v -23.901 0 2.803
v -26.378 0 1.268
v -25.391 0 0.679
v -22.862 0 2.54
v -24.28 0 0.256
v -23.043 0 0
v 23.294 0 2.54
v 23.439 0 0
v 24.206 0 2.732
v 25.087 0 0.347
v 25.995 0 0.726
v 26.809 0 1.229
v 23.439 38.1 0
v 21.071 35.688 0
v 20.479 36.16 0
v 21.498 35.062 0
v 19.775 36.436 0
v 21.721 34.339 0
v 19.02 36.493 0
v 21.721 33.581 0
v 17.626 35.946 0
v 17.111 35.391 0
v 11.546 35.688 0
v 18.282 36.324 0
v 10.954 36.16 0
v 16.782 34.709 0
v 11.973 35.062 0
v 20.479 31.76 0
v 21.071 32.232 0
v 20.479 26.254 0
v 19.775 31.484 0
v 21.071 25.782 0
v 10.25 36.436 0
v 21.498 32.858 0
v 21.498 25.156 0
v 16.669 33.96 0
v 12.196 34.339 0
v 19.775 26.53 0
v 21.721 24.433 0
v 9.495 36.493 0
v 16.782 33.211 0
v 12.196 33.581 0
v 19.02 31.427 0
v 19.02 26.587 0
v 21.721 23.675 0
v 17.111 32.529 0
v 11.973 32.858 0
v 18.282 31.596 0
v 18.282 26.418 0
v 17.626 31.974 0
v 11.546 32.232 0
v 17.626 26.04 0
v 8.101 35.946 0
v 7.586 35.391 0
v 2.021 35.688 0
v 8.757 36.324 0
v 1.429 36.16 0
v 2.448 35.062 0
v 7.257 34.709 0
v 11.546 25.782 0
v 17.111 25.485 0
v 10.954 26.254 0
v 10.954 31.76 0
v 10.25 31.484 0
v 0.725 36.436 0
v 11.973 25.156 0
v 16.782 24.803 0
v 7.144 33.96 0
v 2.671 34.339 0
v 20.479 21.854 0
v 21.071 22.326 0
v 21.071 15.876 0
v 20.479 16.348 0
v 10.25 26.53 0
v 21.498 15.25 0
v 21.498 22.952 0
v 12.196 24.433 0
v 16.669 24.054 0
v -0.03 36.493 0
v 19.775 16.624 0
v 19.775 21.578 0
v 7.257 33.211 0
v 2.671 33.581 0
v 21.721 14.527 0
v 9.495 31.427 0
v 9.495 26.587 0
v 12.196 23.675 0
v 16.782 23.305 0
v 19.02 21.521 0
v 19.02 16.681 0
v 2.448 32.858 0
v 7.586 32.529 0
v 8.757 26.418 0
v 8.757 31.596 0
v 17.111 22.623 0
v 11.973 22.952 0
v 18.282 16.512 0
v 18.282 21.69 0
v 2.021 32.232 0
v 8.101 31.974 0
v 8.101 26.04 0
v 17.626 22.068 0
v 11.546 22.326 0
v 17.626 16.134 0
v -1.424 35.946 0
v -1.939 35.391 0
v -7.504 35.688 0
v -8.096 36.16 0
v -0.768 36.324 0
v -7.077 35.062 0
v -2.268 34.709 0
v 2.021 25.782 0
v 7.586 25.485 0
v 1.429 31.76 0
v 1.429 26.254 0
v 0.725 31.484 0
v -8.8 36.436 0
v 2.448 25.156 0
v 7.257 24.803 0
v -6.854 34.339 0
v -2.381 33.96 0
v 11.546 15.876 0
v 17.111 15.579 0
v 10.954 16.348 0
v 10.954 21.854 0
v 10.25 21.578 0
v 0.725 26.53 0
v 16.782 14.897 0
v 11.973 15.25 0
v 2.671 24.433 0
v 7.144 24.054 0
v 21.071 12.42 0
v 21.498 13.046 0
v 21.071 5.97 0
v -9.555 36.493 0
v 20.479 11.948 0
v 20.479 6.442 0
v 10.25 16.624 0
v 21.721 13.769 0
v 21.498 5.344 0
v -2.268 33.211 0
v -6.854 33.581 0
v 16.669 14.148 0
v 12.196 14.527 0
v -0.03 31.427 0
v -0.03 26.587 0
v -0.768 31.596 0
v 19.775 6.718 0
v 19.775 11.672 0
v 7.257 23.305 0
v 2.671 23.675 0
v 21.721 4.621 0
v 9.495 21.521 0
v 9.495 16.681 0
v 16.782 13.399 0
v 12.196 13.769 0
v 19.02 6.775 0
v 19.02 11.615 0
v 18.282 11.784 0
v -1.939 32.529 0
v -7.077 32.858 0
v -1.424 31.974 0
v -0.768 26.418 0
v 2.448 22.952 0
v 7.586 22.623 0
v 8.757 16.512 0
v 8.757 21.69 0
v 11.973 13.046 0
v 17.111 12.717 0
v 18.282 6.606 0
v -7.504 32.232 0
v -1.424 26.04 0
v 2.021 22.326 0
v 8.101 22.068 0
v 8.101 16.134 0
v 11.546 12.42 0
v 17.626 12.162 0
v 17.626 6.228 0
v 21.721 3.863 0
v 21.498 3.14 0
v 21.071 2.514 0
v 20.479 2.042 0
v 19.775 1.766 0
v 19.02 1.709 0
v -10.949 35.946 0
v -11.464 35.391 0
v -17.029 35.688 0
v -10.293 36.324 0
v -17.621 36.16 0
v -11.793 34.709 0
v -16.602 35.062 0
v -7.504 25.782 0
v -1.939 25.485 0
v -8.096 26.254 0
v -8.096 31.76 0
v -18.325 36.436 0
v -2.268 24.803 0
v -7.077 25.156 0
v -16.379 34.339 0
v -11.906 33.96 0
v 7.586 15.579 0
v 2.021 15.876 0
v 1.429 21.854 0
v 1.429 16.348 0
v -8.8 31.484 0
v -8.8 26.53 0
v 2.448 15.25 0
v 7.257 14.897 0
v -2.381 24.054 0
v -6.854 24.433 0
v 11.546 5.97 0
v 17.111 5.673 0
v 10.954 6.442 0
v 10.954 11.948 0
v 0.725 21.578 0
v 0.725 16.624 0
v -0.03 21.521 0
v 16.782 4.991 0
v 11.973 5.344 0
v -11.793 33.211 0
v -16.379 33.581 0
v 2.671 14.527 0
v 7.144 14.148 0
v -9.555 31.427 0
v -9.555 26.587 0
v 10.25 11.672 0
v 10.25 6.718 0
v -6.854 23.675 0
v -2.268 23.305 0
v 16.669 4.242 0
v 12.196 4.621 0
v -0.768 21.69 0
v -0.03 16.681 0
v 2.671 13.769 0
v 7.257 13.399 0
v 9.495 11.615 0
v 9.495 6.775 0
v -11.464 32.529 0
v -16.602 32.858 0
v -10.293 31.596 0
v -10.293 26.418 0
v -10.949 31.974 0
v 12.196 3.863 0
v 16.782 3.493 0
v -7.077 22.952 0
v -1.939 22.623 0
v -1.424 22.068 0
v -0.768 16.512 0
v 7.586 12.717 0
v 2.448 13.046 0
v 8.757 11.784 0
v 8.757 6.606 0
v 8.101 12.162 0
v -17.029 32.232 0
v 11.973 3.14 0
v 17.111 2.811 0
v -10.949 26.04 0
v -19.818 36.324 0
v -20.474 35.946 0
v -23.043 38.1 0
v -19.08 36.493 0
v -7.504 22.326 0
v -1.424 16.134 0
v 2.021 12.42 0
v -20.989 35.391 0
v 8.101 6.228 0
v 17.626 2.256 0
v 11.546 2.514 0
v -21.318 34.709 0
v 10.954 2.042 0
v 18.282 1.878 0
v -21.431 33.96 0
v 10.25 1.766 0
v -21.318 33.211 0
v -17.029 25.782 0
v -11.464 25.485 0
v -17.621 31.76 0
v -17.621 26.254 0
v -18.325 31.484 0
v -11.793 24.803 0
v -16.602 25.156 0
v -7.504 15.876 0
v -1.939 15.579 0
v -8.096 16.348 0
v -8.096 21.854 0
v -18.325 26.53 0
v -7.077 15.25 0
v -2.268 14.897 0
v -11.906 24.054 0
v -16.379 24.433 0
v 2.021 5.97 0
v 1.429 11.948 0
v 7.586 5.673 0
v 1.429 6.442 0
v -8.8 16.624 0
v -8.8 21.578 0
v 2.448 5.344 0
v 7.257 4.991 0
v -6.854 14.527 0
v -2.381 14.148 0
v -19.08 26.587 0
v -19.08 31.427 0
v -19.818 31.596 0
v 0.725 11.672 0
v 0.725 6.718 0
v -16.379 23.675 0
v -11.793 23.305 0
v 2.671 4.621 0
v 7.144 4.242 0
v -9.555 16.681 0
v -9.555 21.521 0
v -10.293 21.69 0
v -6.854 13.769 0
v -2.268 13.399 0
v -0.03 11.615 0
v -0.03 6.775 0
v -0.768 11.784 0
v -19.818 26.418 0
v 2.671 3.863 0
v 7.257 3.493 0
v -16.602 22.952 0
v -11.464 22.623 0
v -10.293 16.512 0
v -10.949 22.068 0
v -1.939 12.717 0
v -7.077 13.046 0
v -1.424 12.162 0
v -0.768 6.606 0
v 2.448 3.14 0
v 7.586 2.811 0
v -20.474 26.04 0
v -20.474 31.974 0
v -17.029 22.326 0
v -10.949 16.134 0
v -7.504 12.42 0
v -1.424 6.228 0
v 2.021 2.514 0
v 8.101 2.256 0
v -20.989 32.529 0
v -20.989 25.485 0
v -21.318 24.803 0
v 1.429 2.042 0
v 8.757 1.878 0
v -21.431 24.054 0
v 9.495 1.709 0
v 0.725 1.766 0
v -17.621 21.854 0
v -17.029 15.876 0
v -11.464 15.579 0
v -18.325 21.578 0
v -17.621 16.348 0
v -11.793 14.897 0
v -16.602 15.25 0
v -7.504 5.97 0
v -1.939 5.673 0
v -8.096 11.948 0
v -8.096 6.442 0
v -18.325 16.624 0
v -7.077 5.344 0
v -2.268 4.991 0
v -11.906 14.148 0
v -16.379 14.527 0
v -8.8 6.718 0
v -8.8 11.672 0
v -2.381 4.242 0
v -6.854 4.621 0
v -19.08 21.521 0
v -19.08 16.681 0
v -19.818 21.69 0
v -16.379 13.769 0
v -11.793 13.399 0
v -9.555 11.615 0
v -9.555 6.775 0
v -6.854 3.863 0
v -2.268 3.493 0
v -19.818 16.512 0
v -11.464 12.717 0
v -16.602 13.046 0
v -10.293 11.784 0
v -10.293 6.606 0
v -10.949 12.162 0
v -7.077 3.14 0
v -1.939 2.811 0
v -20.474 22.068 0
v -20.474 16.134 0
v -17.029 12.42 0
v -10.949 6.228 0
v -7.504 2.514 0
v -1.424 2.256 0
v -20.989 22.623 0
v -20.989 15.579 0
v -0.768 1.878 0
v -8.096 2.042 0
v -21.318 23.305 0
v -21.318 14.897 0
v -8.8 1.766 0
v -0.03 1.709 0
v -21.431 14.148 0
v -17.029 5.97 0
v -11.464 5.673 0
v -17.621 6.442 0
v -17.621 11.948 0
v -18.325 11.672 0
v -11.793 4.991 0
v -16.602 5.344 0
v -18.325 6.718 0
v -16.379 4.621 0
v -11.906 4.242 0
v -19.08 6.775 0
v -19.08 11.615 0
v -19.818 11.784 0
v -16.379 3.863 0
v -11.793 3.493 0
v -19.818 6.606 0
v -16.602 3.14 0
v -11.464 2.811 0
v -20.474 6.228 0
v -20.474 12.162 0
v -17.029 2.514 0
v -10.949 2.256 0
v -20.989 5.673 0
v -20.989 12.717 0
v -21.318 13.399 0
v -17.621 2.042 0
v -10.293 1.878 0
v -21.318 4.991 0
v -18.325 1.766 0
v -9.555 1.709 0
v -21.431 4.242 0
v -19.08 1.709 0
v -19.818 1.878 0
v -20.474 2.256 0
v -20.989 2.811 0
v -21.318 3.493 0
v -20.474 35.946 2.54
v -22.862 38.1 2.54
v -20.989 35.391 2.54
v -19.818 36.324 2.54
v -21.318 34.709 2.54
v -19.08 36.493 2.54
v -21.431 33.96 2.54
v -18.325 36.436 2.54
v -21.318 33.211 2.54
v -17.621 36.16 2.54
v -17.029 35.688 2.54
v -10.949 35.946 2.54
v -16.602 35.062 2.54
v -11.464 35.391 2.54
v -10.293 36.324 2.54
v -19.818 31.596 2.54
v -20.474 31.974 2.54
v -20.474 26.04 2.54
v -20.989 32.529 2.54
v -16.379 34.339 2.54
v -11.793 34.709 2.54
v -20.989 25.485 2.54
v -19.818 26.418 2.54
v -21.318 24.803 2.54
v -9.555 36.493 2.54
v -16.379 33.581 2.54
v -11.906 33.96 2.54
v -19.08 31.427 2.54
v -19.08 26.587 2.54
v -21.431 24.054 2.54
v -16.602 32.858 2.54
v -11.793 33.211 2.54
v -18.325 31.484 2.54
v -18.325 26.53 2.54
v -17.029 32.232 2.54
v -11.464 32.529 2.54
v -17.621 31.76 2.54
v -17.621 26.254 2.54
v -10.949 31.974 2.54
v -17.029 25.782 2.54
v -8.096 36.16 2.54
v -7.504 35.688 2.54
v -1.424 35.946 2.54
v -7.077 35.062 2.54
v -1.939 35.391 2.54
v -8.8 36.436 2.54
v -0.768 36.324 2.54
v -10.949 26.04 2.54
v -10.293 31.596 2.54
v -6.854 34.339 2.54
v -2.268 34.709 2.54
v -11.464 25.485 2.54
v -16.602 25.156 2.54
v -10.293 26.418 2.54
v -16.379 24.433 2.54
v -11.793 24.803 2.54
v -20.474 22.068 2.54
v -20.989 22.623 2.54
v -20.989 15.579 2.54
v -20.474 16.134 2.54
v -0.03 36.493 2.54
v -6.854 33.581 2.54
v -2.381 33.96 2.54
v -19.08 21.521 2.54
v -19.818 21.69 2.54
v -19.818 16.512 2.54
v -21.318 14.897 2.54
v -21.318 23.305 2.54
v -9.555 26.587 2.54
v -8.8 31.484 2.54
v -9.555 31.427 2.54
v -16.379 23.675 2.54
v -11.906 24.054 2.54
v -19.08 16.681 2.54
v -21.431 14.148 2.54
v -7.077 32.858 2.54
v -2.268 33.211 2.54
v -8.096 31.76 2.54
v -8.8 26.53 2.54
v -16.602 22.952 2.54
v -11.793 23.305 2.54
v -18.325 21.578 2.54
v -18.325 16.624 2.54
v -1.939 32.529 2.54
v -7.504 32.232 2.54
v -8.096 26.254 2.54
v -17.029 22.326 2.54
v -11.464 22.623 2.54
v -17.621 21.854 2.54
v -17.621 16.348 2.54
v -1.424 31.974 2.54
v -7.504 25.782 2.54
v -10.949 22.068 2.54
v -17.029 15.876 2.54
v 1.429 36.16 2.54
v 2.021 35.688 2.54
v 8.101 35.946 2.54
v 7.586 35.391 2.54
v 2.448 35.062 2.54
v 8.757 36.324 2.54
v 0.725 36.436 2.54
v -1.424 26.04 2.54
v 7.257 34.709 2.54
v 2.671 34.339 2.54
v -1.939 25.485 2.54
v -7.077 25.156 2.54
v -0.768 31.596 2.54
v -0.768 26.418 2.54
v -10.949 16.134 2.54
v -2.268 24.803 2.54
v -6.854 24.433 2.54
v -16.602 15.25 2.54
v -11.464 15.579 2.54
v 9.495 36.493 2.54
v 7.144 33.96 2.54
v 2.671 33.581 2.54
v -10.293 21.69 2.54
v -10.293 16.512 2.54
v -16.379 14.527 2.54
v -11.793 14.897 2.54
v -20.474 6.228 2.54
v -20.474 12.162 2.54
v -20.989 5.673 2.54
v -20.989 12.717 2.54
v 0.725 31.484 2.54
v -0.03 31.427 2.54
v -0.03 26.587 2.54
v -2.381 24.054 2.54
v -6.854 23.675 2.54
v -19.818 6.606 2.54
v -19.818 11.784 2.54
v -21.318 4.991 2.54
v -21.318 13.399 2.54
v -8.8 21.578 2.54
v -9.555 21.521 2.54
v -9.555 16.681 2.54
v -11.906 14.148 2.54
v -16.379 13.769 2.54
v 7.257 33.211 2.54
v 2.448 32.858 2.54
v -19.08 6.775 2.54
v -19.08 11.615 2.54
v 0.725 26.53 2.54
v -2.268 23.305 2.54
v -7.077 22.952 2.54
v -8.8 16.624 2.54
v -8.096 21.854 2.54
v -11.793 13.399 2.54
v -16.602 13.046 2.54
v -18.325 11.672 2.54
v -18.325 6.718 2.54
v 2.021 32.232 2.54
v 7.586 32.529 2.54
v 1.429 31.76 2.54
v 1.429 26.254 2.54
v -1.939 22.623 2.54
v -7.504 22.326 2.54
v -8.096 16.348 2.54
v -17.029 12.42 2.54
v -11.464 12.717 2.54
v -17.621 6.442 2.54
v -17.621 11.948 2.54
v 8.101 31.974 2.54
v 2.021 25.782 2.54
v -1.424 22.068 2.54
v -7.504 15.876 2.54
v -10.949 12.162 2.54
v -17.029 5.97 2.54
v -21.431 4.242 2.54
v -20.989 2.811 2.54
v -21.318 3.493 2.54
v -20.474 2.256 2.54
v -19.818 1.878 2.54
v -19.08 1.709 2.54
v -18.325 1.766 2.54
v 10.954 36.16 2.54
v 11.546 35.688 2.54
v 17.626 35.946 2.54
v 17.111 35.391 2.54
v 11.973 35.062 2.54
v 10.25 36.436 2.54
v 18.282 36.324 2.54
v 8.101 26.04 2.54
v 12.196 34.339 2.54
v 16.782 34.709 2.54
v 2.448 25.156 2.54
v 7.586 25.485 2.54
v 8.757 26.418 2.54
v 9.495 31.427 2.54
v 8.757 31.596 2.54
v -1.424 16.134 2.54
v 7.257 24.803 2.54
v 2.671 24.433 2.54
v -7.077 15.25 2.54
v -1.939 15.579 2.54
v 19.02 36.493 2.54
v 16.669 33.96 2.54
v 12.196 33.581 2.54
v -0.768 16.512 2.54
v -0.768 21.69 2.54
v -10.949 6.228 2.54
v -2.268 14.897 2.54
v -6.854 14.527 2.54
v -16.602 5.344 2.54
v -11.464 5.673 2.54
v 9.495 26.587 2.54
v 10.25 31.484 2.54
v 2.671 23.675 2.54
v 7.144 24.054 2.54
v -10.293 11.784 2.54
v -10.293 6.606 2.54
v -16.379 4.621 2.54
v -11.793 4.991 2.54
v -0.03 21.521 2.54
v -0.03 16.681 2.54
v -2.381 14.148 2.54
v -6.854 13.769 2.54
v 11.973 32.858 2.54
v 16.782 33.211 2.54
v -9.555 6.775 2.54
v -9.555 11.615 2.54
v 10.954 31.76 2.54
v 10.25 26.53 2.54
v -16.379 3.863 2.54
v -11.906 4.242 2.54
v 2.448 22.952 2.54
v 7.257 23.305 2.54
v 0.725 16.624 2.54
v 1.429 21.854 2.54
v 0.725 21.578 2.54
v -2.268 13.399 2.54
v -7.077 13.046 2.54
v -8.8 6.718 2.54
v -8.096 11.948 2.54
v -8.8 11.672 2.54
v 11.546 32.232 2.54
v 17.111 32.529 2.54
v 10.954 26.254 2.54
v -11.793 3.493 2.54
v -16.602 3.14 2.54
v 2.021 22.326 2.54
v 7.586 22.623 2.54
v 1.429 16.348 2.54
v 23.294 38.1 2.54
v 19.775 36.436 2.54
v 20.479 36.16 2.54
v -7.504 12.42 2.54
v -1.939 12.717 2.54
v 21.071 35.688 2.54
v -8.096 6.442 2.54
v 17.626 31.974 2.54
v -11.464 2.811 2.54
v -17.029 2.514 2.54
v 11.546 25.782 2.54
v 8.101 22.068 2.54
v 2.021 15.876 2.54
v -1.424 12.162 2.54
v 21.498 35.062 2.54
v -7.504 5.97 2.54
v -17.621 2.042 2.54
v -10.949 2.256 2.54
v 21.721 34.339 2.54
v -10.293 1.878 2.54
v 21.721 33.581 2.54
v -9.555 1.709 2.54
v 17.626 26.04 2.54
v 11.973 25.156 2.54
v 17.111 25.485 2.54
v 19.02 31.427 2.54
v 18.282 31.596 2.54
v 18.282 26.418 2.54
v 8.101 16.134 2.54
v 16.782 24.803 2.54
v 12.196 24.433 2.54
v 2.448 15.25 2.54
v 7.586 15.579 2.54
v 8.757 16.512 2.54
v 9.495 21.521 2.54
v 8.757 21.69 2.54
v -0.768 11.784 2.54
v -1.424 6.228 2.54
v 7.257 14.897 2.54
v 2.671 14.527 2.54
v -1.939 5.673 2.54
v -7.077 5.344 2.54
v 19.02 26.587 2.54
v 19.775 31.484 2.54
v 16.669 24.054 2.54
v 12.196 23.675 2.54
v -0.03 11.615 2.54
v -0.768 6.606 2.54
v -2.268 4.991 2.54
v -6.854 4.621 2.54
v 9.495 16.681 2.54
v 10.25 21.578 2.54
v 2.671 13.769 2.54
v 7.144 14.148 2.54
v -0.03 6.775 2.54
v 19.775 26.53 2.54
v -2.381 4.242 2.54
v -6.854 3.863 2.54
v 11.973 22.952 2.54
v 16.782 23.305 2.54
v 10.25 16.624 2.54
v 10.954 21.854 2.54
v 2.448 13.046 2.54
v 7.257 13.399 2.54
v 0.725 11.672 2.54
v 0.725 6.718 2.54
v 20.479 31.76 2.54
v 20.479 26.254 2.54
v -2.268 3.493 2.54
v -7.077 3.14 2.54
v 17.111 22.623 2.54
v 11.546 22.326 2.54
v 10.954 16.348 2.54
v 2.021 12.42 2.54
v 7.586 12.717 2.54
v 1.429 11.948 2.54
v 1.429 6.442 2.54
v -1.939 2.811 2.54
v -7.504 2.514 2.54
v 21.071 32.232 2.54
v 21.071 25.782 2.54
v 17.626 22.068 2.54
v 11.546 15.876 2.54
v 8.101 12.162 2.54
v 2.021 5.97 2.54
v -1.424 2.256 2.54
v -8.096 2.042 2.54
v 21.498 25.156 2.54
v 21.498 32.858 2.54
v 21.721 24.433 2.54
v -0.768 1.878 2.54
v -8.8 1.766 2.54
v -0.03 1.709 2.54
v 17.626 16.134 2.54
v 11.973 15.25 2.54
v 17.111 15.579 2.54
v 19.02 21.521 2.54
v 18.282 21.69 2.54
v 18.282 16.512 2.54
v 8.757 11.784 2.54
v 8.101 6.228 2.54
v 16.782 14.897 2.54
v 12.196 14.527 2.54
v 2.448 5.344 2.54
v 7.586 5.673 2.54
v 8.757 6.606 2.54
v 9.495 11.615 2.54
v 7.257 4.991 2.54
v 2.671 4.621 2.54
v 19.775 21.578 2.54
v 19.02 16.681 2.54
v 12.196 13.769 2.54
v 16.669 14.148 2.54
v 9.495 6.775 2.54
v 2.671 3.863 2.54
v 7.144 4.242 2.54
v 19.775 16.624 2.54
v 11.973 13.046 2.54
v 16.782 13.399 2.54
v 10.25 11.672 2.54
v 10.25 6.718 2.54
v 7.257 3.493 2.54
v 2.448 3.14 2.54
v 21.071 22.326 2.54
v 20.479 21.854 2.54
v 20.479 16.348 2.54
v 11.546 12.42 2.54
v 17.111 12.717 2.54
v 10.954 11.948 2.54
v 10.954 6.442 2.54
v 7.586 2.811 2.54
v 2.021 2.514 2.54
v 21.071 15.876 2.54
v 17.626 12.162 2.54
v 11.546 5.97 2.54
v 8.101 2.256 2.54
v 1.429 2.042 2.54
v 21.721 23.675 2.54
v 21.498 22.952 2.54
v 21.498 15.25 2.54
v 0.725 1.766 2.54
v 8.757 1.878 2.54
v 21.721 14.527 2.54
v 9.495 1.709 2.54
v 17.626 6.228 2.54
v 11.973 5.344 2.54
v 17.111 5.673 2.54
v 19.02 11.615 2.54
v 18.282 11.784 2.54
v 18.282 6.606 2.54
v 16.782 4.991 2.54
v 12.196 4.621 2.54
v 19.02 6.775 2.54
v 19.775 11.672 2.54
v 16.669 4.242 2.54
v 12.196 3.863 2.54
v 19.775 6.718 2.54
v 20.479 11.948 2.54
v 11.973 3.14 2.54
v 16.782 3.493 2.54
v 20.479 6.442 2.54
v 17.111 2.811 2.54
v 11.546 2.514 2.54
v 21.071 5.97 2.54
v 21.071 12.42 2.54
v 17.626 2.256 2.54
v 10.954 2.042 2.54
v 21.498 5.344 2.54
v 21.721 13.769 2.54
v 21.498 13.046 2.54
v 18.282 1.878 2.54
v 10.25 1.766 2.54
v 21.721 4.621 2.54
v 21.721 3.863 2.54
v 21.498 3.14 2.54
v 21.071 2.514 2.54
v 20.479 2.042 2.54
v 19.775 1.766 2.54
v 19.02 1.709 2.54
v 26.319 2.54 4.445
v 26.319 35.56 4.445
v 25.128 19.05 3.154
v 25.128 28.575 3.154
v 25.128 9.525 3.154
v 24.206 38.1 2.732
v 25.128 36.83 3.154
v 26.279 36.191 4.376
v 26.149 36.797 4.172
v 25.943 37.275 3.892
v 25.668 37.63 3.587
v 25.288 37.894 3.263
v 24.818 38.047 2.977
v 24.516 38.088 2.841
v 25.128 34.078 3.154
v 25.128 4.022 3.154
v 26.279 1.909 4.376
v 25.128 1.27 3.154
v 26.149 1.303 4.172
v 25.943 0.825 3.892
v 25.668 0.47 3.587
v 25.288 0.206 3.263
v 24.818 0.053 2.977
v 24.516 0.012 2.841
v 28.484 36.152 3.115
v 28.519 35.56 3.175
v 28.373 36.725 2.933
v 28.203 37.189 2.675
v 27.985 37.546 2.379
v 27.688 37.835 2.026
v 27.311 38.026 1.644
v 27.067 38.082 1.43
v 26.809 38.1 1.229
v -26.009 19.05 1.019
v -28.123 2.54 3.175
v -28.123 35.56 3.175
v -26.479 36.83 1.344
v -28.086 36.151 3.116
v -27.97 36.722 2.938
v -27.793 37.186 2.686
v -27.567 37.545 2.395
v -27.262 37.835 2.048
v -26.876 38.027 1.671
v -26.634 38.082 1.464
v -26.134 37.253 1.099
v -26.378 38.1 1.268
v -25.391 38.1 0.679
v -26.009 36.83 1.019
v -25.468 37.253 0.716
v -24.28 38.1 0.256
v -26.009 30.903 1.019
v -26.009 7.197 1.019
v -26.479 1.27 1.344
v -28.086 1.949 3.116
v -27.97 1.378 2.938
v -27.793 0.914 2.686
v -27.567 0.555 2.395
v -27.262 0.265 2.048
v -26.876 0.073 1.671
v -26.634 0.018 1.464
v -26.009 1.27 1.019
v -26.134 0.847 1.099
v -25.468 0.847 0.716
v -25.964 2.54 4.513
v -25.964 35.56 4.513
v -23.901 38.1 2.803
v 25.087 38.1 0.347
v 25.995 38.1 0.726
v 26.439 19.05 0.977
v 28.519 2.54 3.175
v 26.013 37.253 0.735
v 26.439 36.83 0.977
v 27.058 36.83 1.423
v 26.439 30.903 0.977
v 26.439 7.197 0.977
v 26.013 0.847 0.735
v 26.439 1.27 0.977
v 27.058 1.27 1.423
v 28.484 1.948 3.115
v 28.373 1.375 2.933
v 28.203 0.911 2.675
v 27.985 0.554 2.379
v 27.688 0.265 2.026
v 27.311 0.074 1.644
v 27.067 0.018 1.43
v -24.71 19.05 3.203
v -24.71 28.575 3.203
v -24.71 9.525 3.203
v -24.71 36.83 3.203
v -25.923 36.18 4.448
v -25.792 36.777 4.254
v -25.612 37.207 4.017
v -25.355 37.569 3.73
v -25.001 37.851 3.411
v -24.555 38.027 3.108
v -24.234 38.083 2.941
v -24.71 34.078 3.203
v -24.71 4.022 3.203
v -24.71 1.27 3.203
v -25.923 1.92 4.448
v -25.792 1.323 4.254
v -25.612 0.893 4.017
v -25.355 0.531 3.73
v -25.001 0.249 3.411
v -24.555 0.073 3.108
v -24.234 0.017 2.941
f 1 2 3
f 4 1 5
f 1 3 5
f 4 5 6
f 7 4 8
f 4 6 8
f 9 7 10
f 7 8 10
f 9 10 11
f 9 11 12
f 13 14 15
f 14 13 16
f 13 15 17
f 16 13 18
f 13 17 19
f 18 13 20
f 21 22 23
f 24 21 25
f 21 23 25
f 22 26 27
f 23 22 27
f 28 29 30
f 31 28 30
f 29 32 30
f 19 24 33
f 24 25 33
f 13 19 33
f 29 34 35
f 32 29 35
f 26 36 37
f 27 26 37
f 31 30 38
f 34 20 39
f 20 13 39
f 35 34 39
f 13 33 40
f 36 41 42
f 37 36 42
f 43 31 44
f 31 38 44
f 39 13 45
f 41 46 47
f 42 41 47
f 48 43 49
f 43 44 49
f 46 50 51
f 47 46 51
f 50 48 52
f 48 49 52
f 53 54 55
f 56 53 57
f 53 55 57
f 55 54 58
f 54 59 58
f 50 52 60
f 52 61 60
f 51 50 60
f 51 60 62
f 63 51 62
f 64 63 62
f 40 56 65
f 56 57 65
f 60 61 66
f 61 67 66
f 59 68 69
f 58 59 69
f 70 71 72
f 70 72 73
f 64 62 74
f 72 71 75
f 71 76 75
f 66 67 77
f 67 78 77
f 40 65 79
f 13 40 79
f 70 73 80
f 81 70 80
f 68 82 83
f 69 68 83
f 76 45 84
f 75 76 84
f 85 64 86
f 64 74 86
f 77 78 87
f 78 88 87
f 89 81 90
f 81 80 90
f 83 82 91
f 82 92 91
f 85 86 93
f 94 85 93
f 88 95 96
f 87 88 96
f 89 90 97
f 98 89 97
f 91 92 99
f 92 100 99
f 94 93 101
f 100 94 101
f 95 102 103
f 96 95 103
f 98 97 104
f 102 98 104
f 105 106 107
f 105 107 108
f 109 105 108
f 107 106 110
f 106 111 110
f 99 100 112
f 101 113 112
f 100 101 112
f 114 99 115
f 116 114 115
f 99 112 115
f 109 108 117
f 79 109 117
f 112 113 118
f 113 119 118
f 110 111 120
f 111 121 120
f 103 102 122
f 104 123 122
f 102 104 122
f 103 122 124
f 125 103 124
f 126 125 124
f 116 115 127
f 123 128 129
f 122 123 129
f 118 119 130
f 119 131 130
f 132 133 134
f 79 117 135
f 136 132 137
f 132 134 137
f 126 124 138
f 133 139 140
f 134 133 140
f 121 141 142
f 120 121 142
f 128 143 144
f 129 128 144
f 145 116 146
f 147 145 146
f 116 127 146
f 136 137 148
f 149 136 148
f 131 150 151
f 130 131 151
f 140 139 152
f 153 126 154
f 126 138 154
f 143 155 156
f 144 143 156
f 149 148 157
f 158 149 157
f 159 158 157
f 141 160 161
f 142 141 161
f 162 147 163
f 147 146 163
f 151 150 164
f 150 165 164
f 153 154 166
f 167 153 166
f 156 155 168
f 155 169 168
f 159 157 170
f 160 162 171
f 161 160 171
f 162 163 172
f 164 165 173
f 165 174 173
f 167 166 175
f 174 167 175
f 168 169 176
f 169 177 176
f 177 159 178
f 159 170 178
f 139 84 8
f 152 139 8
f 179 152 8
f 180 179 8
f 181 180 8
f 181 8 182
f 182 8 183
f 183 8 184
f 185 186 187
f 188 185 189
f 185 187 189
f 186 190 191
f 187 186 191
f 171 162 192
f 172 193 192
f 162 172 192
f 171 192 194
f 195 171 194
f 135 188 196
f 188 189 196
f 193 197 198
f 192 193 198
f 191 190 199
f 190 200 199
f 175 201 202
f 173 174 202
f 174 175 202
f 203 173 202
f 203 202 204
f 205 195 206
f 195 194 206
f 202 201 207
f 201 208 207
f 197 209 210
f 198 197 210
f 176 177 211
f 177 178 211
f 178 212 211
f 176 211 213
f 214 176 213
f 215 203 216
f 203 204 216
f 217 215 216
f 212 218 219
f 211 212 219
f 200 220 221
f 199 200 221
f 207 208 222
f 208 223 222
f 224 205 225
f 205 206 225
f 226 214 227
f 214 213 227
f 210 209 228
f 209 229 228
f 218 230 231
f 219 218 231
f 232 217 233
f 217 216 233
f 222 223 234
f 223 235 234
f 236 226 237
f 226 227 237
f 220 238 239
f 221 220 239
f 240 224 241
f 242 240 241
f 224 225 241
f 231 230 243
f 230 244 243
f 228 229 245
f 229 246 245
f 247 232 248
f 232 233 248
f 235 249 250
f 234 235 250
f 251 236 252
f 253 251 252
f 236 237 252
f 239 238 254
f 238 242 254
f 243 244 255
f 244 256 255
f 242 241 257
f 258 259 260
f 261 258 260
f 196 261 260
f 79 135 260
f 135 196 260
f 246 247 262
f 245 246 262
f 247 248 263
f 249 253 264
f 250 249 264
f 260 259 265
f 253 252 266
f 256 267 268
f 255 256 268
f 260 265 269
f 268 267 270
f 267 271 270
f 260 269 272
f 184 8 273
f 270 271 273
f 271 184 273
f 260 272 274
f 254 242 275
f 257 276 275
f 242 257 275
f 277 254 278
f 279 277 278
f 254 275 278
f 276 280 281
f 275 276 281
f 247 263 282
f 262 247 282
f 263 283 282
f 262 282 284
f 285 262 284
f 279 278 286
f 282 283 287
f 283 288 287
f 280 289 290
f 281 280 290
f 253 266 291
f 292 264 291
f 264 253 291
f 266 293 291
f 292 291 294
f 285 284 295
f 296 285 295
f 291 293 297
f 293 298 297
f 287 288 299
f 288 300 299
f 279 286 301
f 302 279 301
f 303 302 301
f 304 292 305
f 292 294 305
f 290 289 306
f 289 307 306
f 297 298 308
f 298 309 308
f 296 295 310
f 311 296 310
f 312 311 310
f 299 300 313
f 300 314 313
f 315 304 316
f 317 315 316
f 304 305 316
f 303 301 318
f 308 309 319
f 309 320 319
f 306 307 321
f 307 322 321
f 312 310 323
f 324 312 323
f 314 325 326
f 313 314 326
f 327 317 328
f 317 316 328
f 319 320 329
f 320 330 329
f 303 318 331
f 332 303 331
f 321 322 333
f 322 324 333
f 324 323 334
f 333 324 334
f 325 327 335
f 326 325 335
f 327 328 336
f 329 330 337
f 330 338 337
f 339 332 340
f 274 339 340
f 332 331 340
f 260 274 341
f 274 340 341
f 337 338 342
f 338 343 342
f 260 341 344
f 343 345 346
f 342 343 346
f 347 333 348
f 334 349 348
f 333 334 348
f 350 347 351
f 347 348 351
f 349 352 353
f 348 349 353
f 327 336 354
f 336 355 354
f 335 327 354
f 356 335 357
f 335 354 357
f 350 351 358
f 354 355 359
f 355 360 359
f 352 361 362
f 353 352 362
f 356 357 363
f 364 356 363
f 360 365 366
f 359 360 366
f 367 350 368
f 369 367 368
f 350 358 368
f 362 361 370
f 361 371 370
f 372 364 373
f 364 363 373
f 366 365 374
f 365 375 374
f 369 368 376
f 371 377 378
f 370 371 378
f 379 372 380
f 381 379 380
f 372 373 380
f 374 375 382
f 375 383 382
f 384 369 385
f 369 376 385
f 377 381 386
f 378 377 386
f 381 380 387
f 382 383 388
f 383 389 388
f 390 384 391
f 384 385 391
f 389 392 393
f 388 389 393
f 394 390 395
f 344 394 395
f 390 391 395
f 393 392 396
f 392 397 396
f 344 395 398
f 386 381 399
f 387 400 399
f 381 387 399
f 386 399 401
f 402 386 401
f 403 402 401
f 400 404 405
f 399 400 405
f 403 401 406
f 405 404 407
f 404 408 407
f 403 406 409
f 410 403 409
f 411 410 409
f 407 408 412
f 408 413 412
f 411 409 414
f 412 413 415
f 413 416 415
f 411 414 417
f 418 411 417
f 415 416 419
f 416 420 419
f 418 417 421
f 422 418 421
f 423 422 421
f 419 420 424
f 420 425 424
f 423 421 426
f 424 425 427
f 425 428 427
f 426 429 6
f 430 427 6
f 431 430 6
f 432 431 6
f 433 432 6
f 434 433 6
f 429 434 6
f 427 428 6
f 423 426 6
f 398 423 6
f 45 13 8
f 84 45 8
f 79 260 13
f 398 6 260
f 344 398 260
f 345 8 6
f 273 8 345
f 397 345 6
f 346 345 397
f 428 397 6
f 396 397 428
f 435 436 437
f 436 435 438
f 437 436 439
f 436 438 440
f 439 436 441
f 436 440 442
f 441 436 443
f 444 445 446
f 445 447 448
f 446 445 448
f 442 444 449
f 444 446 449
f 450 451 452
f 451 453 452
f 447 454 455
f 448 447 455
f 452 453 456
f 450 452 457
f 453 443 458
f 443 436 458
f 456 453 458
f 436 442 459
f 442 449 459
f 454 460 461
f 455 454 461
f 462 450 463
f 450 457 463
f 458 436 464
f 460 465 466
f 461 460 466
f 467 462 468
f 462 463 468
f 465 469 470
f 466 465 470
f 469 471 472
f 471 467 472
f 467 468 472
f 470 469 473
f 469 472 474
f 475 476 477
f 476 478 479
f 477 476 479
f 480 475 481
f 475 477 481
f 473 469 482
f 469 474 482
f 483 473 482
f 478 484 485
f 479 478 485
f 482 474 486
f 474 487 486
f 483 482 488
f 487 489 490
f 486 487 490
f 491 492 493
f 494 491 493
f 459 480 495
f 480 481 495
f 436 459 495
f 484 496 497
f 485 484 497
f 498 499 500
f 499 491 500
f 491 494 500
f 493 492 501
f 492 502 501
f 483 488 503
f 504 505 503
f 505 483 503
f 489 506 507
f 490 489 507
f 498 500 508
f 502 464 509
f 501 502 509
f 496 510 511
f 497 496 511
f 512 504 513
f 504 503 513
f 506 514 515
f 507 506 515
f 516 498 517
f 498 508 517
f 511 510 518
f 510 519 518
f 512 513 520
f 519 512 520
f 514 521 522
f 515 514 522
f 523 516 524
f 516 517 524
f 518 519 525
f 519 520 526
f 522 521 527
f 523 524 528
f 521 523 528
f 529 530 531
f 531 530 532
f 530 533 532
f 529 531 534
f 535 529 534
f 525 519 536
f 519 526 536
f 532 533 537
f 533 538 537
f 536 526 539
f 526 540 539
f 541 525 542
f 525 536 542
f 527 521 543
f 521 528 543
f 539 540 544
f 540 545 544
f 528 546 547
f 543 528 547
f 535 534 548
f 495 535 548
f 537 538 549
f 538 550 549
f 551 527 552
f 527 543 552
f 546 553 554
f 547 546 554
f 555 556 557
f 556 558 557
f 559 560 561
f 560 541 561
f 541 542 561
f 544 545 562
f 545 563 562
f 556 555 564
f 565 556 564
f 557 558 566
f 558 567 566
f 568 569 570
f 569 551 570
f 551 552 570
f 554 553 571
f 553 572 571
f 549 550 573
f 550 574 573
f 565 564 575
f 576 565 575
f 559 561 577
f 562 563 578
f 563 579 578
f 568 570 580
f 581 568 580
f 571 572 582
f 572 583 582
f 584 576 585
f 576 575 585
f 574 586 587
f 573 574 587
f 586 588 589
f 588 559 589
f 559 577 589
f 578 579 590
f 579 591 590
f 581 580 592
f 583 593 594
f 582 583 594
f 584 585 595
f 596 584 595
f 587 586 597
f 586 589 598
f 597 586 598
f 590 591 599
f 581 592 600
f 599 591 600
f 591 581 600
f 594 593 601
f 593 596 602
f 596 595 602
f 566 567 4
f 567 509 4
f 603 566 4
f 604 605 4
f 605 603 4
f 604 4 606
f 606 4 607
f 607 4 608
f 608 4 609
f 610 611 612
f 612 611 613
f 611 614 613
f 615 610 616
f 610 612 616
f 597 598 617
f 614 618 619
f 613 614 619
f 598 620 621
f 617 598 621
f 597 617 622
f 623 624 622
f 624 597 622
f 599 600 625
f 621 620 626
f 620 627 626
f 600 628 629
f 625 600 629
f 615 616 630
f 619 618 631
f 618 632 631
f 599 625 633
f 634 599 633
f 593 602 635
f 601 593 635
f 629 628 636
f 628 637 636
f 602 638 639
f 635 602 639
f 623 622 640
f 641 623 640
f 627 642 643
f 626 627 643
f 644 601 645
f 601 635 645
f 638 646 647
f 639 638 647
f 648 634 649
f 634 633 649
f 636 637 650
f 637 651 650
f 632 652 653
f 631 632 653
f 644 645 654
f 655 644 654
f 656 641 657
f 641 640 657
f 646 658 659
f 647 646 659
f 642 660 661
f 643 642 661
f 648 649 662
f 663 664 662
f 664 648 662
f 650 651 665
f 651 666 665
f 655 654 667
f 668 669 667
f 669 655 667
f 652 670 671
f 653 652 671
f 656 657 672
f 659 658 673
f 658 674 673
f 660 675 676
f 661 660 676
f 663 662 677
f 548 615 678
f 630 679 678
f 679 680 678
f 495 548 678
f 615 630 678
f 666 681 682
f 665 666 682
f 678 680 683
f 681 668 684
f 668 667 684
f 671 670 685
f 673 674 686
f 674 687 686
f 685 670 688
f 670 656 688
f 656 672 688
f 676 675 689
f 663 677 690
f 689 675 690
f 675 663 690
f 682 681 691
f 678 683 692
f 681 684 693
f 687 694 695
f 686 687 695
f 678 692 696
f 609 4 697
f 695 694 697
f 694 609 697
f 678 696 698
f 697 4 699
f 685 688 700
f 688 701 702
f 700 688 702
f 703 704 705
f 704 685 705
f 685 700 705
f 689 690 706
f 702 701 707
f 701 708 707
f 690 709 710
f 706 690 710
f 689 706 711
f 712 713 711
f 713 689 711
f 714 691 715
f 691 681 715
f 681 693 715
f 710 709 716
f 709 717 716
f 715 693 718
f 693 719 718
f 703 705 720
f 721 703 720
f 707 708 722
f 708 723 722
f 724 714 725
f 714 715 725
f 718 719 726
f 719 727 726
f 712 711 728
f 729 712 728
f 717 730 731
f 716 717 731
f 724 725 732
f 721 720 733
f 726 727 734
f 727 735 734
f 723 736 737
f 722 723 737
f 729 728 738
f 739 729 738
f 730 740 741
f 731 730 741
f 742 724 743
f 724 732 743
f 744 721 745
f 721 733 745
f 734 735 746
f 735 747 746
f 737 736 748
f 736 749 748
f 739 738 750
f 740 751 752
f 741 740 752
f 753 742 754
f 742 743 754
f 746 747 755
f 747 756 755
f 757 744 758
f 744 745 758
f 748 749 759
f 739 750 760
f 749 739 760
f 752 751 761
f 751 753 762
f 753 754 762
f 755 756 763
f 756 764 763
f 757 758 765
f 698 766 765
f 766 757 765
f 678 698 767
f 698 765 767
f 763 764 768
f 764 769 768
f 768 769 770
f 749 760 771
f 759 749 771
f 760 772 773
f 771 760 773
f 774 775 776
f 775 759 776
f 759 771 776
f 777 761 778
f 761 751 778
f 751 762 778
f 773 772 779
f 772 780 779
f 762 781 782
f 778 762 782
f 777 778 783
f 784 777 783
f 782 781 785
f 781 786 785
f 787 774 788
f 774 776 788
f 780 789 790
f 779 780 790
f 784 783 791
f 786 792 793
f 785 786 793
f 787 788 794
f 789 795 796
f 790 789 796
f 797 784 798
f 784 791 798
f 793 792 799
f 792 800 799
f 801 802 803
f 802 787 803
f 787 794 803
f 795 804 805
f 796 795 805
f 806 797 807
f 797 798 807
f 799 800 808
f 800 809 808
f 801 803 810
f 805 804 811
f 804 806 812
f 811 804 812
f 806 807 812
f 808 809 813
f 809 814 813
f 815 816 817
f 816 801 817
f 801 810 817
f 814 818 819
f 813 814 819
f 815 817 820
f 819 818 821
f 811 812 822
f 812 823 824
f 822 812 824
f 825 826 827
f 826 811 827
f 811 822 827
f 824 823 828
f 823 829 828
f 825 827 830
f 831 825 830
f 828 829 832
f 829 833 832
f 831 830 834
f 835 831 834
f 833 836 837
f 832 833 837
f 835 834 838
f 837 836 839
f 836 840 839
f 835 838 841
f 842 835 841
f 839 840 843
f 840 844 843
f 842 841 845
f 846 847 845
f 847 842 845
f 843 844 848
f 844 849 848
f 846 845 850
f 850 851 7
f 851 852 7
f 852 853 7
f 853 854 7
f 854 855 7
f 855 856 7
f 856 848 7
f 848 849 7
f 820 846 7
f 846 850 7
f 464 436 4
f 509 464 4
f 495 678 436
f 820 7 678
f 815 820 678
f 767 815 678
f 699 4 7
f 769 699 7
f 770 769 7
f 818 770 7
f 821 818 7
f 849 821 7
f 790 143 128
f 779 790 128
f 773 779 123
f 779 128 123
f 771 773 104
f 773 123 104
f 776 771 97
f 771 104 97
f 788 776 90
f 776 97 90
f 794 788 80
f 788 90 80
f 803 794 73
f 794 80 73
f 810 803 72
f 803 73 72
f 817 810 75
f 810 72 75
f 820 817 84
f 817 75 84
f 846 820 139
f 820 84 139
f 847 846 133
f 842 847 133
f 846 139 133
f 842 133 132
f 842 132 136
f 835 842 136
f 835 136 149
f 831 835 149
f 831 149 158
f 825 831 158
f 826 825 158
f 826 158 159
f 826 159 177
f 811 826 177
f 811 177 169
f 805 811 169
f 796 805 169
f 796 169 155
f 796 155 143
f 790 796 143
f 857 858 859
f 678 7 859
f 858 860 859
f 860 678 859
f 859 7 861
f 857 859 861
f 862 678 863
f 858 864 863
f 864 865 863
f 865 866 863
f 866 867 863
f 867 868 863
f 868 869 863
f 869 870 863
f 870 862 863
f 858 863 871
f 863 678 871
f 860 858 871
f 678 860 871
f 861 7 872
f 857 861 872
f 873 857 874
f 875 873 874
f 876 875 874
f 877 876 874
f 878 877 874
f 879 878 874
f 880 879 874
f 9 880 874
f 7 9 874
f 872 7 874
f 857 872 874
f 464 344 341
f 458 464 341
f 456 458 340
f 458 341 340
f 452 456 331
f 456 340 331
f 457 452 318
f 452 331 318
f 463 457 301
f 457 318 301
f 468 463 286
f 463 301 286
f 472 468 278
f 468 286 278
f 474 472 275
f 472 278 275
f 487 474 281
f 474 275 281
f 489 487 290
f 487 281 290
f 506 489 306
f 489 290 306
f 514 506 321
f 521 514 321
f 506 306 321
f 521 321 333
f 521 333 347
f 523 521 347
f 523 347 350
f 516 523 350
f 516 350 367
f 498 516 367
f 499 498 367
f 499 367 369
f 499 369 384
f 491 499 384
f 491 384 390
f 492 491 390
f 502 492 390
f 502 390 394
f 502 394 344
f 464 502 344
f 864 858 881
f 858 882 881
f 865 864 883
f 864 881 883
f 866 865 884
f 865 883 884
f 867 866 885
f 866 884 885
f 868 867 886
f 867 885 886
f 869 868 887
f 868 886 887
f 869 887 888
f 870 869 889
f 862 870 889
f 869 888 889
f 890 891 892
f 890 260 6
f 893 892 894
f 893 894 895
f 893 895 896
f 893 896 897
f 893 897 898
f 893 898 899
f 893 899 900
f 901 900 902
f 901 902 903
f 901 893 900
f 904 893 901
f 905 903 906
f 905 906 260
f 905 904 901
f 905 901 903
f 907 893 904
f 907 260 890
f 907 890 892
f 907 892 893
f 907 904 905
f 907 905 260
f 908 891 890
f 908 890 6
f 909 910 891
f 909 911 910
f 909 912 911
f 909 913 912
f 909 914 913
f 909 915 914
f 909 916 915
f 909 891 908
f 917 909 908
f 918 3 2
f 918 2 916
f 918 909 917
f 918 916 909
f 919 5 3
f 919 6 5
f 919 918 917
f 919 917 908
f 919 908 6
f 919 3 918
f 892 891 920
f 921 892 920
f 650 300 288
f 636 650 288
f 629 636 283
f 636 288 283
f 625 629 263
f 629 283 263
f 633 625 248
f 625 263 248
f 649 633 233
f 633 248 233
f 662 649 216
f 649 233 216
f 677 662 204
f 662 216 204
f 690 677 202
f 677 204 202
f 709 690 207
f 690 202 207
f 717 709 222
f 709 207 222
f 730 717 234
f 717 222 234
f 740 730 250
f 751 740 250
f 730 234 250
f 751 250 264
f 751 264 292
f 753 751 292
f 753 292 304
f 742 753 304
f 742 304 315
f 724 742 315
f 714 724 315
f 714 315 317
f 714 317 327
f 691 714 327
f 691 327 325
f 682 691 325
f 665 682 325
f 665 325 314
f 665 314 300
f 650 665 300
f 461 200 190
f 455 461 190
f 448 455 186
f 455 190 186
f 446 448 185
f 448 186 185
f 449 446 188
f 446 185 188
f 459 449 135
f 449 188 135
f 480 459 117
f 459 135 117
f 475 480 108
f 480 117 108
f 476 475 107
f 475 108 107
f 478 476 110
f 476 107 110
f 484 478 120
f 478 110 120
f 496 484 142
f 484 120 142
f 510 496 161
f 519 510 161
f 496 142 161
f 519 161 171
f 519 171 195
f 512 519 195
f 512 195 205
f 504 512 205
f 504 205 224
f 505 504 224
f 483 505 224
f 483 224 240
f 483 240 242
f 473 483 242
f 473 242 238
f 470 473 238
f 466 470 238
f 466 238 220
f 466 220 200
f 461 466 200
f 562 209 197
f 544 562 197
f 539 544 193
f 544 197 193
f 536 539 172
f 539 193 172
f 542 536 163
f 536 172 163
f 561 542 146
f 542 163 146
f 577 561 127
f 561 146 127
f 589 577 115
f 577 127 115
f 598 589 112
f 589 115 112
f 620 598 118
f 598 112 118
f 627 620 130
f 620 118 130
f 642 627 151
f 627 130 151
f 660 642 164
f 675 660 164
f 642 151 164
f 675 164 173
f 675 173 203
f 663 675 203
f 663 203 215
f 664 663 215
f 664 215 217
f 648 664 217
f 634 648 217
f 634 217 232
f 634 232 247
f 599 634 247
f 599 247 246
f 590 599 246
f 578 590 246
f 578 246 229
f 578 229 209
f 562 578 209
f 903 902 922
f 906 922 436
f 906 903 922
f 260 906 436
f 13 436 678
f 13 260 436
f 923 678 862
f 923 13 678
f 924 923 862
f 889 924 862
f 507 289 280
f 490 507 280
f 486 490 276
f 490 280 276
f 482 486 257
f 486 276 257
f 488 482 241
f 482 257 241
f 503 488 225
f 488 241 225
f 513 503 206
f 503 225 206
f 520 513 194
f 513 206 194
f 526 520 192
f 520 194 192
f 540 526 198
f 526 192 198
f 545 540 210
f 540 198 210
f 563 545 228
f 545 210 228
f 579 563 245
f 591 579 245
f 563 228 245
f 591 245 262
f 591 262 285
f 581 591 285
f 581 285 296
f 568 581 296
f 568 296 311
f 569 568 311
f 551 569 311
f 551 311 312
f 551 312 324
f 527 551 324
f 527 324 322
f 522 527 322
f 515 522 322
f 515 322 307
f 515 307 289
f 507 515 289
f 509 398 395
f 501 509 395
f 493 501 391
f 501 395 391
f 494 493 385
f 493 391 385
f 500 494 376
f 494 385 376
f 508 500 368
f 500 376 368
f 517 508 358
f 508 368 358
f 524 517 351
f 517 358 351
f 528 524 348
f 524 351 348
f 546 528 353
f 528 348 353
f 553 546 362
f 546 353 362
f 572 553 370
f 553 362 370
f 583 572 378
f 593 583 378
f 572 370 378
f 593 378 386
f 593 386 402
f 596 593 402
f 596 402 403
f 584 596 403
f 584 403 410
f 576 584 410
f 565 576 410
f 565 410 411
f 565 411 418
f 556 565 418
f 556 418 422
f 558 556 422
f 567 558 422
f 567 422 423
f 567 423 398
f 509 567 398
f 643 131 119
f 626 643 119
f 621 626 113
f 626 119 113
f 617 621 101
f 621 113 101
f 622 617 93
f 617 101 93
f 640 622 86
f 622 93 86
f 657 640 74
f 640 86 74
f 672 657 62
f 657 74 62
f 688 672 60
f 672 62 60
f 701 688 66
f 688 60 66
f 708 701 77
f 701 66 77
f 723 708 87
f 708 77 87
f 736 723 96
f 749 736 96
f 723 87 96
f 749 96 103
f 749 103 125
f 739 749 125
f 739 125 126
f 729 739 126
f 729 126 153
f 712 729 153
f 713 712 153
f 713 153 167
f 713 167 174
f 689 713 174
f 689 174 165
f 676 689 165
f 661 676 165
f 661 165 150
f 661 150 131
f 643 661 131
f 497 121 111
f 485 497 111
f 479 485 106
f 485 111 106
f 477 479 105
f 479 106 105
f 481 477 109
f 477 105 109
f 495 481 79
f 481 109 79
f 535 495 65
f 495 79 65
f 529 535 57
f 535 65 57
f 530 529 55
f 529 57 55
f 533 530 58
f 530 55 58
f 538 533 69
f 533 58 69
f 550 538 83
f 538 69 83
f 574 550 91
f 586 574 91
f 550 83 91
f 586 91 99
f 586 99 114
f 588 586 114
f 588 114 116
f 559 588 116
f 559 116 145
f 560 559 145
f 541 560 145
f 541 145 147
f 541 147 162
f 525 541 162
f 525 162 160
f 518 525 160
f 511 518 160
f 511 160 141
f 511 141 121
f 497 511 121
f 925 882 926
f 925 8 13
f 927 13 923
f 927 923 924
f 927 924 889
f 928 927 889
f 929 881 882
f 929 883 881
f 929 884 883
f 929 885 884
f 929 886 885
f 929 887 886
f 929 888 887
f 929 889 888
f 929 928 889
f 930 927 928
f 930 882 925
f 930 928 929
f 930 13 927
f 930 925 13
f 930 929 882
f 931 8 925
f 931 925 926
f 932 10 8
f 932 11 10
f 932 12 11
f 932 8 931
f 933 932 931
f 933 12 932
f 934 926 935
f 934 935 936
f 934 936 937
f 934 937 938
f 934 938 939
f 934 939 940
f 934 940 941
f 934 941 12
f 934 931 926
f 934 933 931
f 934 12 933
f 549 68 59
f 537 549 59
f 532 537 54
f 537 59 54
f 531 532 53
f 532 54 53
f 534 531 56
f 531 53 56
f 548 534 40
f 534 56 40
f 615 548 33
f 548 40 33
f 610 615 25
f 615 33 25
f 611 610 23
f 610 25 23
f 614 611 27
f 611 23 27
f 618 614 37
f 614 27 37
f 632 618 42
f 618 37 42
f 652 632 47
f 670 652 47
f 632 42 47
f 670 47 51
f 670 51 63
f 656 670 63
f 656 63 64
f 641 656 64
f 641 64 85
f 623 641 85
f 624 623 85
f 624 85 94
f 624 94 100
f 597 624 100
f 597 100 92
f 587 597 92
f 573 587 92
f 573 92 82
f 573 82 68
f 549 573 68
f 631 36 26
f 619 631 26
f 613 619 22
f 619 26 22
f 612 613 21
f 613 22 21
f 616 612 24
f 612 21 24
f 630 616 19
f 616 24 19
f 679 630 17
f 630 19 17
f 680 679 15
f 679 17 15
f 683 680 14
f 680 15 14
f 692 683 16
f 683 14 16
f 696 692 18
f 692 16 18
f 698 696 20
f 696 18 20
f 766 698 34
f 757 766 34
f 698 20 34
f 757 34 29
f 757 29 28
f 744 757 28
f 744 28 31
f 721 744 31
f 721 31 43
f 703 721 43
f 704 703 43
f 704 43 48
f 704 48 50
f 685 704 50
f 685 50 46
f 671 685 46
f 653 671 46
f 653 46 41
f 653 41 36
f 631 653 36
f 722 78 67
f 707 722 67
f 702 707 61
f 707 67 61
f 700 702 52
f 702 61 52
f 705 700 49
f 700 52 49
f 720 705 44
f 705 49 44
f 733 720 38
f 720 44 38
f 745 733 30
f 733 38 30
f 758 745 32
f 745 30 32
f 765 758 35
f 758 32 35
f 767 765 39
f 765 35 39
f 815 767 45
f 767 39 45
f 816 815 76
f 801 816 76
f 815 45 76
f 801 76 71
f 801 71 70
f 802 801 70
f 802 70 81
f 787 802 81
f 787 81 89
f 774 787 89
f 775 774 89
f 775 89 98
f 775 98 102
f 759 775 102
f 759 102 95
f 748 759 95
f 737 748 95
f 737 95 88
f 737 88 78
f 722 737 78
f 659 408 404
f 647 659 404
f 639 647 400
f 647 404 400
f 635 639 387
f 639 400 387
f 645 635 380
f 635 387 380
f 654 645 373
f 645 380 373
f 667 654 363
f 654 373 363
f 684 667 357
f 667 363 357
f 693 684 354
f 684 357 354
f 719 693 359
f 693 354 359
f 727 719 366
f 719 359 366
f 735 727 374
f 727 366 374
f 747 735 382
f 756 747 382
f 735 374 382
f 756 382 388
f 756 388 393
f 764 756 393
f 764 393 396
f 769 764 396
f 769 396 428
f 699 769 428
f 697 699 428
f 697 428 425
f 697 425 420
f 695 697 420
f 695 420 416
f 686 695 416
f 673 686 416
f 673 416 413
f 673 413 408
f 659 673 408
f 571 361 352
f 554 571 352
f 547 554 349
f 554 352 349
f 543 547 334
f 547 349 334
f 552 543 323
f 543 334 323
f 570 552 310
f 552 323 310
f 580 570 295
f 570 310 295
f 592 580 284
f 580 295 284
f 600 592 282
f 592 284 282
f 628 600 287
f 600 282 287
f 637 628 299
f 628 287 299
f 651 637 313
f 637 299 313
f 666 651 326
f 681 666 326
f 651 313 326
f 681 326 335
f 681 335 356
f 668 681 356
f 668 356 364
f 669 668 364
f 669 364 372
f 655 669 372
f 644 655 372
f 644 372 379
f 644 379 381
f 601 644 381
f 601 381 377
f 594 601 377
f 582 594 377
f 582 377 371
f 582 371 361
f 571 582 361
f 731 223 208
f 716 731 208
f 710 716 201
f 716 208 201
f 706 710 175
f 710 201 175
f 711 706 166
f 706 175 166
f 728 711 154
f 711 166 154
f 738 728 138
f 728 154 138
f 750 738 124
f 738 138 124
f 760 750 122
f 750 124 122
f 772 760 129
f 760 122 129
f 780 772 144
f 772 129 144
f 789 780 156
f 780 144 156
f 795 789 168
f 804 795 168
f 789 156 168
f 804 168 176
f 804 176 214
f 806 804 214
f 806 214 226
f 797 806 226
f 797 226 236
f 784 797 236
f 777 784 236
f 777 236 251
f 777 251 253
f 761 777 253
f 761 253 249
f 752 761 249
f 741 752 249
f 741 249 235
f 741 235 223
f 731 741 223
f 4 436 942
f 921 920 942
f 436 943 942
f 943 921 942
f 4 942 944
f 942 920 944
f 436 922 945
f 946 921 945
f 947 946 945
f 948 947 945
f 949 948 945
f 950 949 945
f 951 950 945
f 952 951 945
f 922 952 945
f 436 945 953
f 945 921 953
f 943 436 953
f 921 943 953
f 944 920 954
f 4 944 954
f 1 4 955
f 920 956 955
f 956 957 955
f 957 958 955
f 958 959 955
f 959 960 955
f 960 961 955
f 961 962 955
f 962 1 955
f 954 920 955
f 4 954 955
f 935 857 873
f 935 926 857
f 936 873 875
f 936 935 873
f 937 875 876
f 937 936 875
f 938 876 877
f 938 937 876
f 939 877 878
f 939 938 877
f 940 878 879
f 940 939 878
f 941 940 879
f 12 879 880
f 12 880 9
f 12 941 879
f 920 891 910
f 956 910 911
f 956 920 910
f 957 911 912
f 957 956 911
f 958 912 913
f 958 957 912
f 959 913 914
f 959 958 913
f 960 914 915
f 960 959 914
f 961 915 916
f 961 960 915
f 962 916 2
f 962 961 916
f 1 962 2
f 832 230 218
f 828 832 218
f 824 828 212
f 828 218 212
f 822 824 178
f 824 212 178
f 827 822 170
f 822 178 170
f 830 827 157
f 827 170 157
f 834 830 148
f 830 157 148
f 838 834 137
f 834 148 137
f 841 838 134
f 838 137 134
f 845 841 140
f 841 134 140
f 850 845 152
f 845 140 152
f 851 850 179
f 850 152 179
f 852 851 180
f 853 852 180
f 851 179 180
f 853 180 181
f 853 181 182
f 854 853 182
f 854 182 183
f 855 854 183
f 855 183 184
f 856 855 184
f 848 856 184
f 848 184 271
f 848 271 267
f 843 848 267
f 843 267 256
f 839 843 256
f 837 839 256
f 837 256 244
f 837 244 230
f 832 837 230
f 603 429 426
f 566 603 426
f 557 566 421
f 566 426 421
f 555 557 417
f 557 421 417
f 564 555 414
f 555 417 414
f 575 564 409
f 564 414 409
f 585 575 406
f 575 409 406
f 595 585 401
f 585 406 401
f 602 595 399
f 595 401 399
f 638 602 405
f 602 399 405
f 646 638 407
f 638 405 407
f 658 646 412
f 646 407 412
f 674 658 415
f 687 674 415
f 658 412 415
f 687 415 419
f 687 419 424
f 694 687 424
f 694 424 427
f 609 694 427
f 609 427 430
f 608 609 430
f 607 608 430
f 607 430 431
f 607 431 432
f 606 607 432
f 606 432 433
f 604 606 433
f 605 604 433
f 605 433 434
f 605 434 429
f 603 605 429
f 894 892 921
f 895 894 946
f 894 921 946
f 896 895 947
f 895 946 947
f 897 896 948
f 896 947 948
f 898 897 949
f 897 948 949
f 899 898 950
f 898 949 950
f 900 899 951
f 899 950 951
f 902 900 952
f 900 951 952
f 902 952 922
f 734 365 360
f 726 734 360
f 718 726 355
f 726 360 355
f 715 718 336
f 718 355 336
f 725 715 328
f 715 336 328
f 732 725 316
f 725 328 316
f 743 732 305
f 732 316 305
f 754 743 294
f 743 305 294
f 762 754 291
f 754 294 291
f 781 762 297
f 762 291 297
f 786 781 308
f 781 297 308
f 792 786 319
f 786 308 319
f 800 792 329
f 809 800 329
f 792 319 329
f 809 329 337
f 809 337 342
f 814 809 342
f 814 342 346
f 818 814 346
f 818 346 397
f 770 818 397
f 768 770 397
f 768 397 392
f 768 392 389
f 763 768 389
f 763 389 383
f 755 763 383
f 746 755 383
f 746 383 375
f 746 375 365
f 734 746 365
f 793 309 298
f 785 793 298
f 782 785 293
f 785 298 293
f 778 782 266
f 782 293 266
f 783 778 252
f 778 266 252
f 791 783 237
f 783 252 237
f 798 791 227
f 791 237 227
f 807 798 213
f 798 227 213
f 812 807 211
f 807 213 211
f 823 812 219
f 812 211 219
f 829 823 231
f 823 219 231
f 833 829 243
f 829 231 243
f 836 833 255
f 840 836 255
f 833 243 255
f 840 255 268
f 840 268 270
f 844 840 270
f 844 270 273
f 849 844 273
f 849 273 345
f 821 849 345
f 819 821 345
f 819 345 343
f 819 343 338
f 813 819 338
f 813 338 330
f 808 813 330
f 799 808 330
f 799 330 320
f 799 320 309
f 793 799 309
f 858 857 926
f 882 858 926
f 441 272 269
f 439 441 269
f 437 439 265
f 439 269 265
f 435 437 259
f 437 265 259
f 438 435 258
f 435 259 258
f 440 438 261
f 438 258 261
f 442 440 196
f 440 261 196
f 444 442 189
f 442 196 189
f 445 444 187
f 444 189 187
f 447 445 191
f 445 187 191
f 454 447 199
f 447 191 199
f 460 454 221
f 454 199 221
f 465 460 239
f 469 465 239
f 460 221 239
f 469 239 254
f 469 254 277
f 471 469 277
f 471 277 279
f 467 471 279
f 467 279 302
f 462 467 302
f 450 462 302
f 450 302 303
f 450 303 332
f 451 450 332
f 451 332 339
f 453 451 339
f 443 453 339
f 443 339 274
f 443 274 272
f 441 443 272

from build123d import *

# Parameters (mm, degrees)
EXTRUDE_THIN1_DEPTH  = 38.1
FILLET4_R            = 2.54
CUT_EXTRUDE1_REACH   = 49.805
SKETCH2_R            = 2.54
LPATTERN1_COUNT      = 5
LPATTERN1_PITCH      = 9.525
LPATTERN1_COUNT_DIR2 = 4
LPATTERN1_PITCH_DIR2 = 9.906


# Read off the part's stored shape, not the designer's step: Extrude-Thin1
with BuildPart() as part:
    # Extrude-Thin1 outline → Extrude-Thin1 (new body)
    with BuildSketch(Plane(origin=(0, 0, 0), x_dir=(1, 0, 0), z_dir=(0, 1, 0))):
        with BuildLine():
            Line((-22.861781044, -2.54), (23.293769416, -2.54))
            add(Edge.make_bspline(
                [(23.293769416, -2.54), (23.690788447, -2.589711931), (24.035397246, -2.670596213), (24.637666039, -2.878281595), (24.89574137, -3.004419147), (25.360322074, -3.302989633), (25.56786948, -3.475729285), (25.960337052, -3.895478718), (26.145315815, -4.143465548), (26.319262748, -4.44481044)],
                knots=[0, 0, 0, 0, 0.25, 0.25, 0.5, 0.5, 0.75, 0.75, 1, 1, 1, 1], degree=3))
            Line((26.319262748, -4.44481044), (28.519076705, -3.175))
            add(Edge.make_bspline(
                [(23.439076705, 0), (26.898166275, -0.366941984), (28.519076705, -3.175)],
                knots=[0, 0, 0, 1, 1, 1], degree=2))
            Line((23.439076705, 0), (-23.042923295, 0))
            add(Edge.make_bspline(
                [(-28.122923295, -3.175), (-26.434307868, -0.449952866), (-23.042923295, 0)],
                knots=[0, 0, 0, 1, 1, 1], degree=2))
            Line((-28.122923295, -3.175), (-25.963846277, -4.512903744))
            add(Edge.make_bspline(
                [(-25.963846277, -4.512903744), (-25.780355431, -4.216790612), (-25.585675804, -3.967832958), (-25.171704683, -3.539458263), (-24.952325189, -3.359368522), (-24.467192442, -3.046070455), (-24.200731304, -2.912638022), (-23.592393193, -2.689707924), (-23.250169649, -2.600640103), (-22.861781044, -2.54)],
                knots=[0, 0, 0, 0, 0.25, 0.25, 0.5, 0.5, 0.75, 0.75, 1, 1, 1, 1], degree=3))
        make_face()
    extrude(amount=EXTRUDE_THIN1_DEPTH)

    # Fillet4
    fillet4_edges = [part.edges().sort_by_distance(p)[0] for p in [
        (27.419169727, 38.1, 3.80990522),
        (27.419169727, 0, 3.80990522),
        (-27.043384786, 0, 3.843951872),
        (-27.043384786, 38.1, 3.843951872),
    ]]
    fillet(fillet4_edges, radius=FILLET4_R)

    # Sketch2 → Cut-Extrude1 (cut, up to next)
    with BuildSketch(Plane(origin=(0, 0, 0), x_dir=(-1, 0, 0), z_dir=(0, 0, -1)), mode=Mode.PRIVATE) as cut_extrude1_sk1:
        with Locations((18.890510813, 33.960005412)):
            Circle(SKETCH2_R)
    cut_extrude1_tool1 = extrude(cut_extrude1_sk1.sketch, amount=-CUT_EXTRUDE1_REACH, mode=Mode.PRIVATE) & part.part
    cut_extrude1 = cut_extrude1_tool1.solids().sort_by_distance((-18.890511, 33.960005, 0))[0]
    add(cut_extrude1, mode=Mode.SUBTRACT)

    # LPattern1: Cut-Extrude1 5 × 4
    with Locations(*[(i * LPATTERN1_PITCH, -j * LPATTERN1_PITCH_DIR2, 0) for i in range(LPATTERN1_COUNT) for j in range(LPATTERN1_COUNT_DIR2) if (i, j) != (0, 0)]):
        add(cut_extrude1, mode=Mode.SUBTRACT)


solid = part.part
